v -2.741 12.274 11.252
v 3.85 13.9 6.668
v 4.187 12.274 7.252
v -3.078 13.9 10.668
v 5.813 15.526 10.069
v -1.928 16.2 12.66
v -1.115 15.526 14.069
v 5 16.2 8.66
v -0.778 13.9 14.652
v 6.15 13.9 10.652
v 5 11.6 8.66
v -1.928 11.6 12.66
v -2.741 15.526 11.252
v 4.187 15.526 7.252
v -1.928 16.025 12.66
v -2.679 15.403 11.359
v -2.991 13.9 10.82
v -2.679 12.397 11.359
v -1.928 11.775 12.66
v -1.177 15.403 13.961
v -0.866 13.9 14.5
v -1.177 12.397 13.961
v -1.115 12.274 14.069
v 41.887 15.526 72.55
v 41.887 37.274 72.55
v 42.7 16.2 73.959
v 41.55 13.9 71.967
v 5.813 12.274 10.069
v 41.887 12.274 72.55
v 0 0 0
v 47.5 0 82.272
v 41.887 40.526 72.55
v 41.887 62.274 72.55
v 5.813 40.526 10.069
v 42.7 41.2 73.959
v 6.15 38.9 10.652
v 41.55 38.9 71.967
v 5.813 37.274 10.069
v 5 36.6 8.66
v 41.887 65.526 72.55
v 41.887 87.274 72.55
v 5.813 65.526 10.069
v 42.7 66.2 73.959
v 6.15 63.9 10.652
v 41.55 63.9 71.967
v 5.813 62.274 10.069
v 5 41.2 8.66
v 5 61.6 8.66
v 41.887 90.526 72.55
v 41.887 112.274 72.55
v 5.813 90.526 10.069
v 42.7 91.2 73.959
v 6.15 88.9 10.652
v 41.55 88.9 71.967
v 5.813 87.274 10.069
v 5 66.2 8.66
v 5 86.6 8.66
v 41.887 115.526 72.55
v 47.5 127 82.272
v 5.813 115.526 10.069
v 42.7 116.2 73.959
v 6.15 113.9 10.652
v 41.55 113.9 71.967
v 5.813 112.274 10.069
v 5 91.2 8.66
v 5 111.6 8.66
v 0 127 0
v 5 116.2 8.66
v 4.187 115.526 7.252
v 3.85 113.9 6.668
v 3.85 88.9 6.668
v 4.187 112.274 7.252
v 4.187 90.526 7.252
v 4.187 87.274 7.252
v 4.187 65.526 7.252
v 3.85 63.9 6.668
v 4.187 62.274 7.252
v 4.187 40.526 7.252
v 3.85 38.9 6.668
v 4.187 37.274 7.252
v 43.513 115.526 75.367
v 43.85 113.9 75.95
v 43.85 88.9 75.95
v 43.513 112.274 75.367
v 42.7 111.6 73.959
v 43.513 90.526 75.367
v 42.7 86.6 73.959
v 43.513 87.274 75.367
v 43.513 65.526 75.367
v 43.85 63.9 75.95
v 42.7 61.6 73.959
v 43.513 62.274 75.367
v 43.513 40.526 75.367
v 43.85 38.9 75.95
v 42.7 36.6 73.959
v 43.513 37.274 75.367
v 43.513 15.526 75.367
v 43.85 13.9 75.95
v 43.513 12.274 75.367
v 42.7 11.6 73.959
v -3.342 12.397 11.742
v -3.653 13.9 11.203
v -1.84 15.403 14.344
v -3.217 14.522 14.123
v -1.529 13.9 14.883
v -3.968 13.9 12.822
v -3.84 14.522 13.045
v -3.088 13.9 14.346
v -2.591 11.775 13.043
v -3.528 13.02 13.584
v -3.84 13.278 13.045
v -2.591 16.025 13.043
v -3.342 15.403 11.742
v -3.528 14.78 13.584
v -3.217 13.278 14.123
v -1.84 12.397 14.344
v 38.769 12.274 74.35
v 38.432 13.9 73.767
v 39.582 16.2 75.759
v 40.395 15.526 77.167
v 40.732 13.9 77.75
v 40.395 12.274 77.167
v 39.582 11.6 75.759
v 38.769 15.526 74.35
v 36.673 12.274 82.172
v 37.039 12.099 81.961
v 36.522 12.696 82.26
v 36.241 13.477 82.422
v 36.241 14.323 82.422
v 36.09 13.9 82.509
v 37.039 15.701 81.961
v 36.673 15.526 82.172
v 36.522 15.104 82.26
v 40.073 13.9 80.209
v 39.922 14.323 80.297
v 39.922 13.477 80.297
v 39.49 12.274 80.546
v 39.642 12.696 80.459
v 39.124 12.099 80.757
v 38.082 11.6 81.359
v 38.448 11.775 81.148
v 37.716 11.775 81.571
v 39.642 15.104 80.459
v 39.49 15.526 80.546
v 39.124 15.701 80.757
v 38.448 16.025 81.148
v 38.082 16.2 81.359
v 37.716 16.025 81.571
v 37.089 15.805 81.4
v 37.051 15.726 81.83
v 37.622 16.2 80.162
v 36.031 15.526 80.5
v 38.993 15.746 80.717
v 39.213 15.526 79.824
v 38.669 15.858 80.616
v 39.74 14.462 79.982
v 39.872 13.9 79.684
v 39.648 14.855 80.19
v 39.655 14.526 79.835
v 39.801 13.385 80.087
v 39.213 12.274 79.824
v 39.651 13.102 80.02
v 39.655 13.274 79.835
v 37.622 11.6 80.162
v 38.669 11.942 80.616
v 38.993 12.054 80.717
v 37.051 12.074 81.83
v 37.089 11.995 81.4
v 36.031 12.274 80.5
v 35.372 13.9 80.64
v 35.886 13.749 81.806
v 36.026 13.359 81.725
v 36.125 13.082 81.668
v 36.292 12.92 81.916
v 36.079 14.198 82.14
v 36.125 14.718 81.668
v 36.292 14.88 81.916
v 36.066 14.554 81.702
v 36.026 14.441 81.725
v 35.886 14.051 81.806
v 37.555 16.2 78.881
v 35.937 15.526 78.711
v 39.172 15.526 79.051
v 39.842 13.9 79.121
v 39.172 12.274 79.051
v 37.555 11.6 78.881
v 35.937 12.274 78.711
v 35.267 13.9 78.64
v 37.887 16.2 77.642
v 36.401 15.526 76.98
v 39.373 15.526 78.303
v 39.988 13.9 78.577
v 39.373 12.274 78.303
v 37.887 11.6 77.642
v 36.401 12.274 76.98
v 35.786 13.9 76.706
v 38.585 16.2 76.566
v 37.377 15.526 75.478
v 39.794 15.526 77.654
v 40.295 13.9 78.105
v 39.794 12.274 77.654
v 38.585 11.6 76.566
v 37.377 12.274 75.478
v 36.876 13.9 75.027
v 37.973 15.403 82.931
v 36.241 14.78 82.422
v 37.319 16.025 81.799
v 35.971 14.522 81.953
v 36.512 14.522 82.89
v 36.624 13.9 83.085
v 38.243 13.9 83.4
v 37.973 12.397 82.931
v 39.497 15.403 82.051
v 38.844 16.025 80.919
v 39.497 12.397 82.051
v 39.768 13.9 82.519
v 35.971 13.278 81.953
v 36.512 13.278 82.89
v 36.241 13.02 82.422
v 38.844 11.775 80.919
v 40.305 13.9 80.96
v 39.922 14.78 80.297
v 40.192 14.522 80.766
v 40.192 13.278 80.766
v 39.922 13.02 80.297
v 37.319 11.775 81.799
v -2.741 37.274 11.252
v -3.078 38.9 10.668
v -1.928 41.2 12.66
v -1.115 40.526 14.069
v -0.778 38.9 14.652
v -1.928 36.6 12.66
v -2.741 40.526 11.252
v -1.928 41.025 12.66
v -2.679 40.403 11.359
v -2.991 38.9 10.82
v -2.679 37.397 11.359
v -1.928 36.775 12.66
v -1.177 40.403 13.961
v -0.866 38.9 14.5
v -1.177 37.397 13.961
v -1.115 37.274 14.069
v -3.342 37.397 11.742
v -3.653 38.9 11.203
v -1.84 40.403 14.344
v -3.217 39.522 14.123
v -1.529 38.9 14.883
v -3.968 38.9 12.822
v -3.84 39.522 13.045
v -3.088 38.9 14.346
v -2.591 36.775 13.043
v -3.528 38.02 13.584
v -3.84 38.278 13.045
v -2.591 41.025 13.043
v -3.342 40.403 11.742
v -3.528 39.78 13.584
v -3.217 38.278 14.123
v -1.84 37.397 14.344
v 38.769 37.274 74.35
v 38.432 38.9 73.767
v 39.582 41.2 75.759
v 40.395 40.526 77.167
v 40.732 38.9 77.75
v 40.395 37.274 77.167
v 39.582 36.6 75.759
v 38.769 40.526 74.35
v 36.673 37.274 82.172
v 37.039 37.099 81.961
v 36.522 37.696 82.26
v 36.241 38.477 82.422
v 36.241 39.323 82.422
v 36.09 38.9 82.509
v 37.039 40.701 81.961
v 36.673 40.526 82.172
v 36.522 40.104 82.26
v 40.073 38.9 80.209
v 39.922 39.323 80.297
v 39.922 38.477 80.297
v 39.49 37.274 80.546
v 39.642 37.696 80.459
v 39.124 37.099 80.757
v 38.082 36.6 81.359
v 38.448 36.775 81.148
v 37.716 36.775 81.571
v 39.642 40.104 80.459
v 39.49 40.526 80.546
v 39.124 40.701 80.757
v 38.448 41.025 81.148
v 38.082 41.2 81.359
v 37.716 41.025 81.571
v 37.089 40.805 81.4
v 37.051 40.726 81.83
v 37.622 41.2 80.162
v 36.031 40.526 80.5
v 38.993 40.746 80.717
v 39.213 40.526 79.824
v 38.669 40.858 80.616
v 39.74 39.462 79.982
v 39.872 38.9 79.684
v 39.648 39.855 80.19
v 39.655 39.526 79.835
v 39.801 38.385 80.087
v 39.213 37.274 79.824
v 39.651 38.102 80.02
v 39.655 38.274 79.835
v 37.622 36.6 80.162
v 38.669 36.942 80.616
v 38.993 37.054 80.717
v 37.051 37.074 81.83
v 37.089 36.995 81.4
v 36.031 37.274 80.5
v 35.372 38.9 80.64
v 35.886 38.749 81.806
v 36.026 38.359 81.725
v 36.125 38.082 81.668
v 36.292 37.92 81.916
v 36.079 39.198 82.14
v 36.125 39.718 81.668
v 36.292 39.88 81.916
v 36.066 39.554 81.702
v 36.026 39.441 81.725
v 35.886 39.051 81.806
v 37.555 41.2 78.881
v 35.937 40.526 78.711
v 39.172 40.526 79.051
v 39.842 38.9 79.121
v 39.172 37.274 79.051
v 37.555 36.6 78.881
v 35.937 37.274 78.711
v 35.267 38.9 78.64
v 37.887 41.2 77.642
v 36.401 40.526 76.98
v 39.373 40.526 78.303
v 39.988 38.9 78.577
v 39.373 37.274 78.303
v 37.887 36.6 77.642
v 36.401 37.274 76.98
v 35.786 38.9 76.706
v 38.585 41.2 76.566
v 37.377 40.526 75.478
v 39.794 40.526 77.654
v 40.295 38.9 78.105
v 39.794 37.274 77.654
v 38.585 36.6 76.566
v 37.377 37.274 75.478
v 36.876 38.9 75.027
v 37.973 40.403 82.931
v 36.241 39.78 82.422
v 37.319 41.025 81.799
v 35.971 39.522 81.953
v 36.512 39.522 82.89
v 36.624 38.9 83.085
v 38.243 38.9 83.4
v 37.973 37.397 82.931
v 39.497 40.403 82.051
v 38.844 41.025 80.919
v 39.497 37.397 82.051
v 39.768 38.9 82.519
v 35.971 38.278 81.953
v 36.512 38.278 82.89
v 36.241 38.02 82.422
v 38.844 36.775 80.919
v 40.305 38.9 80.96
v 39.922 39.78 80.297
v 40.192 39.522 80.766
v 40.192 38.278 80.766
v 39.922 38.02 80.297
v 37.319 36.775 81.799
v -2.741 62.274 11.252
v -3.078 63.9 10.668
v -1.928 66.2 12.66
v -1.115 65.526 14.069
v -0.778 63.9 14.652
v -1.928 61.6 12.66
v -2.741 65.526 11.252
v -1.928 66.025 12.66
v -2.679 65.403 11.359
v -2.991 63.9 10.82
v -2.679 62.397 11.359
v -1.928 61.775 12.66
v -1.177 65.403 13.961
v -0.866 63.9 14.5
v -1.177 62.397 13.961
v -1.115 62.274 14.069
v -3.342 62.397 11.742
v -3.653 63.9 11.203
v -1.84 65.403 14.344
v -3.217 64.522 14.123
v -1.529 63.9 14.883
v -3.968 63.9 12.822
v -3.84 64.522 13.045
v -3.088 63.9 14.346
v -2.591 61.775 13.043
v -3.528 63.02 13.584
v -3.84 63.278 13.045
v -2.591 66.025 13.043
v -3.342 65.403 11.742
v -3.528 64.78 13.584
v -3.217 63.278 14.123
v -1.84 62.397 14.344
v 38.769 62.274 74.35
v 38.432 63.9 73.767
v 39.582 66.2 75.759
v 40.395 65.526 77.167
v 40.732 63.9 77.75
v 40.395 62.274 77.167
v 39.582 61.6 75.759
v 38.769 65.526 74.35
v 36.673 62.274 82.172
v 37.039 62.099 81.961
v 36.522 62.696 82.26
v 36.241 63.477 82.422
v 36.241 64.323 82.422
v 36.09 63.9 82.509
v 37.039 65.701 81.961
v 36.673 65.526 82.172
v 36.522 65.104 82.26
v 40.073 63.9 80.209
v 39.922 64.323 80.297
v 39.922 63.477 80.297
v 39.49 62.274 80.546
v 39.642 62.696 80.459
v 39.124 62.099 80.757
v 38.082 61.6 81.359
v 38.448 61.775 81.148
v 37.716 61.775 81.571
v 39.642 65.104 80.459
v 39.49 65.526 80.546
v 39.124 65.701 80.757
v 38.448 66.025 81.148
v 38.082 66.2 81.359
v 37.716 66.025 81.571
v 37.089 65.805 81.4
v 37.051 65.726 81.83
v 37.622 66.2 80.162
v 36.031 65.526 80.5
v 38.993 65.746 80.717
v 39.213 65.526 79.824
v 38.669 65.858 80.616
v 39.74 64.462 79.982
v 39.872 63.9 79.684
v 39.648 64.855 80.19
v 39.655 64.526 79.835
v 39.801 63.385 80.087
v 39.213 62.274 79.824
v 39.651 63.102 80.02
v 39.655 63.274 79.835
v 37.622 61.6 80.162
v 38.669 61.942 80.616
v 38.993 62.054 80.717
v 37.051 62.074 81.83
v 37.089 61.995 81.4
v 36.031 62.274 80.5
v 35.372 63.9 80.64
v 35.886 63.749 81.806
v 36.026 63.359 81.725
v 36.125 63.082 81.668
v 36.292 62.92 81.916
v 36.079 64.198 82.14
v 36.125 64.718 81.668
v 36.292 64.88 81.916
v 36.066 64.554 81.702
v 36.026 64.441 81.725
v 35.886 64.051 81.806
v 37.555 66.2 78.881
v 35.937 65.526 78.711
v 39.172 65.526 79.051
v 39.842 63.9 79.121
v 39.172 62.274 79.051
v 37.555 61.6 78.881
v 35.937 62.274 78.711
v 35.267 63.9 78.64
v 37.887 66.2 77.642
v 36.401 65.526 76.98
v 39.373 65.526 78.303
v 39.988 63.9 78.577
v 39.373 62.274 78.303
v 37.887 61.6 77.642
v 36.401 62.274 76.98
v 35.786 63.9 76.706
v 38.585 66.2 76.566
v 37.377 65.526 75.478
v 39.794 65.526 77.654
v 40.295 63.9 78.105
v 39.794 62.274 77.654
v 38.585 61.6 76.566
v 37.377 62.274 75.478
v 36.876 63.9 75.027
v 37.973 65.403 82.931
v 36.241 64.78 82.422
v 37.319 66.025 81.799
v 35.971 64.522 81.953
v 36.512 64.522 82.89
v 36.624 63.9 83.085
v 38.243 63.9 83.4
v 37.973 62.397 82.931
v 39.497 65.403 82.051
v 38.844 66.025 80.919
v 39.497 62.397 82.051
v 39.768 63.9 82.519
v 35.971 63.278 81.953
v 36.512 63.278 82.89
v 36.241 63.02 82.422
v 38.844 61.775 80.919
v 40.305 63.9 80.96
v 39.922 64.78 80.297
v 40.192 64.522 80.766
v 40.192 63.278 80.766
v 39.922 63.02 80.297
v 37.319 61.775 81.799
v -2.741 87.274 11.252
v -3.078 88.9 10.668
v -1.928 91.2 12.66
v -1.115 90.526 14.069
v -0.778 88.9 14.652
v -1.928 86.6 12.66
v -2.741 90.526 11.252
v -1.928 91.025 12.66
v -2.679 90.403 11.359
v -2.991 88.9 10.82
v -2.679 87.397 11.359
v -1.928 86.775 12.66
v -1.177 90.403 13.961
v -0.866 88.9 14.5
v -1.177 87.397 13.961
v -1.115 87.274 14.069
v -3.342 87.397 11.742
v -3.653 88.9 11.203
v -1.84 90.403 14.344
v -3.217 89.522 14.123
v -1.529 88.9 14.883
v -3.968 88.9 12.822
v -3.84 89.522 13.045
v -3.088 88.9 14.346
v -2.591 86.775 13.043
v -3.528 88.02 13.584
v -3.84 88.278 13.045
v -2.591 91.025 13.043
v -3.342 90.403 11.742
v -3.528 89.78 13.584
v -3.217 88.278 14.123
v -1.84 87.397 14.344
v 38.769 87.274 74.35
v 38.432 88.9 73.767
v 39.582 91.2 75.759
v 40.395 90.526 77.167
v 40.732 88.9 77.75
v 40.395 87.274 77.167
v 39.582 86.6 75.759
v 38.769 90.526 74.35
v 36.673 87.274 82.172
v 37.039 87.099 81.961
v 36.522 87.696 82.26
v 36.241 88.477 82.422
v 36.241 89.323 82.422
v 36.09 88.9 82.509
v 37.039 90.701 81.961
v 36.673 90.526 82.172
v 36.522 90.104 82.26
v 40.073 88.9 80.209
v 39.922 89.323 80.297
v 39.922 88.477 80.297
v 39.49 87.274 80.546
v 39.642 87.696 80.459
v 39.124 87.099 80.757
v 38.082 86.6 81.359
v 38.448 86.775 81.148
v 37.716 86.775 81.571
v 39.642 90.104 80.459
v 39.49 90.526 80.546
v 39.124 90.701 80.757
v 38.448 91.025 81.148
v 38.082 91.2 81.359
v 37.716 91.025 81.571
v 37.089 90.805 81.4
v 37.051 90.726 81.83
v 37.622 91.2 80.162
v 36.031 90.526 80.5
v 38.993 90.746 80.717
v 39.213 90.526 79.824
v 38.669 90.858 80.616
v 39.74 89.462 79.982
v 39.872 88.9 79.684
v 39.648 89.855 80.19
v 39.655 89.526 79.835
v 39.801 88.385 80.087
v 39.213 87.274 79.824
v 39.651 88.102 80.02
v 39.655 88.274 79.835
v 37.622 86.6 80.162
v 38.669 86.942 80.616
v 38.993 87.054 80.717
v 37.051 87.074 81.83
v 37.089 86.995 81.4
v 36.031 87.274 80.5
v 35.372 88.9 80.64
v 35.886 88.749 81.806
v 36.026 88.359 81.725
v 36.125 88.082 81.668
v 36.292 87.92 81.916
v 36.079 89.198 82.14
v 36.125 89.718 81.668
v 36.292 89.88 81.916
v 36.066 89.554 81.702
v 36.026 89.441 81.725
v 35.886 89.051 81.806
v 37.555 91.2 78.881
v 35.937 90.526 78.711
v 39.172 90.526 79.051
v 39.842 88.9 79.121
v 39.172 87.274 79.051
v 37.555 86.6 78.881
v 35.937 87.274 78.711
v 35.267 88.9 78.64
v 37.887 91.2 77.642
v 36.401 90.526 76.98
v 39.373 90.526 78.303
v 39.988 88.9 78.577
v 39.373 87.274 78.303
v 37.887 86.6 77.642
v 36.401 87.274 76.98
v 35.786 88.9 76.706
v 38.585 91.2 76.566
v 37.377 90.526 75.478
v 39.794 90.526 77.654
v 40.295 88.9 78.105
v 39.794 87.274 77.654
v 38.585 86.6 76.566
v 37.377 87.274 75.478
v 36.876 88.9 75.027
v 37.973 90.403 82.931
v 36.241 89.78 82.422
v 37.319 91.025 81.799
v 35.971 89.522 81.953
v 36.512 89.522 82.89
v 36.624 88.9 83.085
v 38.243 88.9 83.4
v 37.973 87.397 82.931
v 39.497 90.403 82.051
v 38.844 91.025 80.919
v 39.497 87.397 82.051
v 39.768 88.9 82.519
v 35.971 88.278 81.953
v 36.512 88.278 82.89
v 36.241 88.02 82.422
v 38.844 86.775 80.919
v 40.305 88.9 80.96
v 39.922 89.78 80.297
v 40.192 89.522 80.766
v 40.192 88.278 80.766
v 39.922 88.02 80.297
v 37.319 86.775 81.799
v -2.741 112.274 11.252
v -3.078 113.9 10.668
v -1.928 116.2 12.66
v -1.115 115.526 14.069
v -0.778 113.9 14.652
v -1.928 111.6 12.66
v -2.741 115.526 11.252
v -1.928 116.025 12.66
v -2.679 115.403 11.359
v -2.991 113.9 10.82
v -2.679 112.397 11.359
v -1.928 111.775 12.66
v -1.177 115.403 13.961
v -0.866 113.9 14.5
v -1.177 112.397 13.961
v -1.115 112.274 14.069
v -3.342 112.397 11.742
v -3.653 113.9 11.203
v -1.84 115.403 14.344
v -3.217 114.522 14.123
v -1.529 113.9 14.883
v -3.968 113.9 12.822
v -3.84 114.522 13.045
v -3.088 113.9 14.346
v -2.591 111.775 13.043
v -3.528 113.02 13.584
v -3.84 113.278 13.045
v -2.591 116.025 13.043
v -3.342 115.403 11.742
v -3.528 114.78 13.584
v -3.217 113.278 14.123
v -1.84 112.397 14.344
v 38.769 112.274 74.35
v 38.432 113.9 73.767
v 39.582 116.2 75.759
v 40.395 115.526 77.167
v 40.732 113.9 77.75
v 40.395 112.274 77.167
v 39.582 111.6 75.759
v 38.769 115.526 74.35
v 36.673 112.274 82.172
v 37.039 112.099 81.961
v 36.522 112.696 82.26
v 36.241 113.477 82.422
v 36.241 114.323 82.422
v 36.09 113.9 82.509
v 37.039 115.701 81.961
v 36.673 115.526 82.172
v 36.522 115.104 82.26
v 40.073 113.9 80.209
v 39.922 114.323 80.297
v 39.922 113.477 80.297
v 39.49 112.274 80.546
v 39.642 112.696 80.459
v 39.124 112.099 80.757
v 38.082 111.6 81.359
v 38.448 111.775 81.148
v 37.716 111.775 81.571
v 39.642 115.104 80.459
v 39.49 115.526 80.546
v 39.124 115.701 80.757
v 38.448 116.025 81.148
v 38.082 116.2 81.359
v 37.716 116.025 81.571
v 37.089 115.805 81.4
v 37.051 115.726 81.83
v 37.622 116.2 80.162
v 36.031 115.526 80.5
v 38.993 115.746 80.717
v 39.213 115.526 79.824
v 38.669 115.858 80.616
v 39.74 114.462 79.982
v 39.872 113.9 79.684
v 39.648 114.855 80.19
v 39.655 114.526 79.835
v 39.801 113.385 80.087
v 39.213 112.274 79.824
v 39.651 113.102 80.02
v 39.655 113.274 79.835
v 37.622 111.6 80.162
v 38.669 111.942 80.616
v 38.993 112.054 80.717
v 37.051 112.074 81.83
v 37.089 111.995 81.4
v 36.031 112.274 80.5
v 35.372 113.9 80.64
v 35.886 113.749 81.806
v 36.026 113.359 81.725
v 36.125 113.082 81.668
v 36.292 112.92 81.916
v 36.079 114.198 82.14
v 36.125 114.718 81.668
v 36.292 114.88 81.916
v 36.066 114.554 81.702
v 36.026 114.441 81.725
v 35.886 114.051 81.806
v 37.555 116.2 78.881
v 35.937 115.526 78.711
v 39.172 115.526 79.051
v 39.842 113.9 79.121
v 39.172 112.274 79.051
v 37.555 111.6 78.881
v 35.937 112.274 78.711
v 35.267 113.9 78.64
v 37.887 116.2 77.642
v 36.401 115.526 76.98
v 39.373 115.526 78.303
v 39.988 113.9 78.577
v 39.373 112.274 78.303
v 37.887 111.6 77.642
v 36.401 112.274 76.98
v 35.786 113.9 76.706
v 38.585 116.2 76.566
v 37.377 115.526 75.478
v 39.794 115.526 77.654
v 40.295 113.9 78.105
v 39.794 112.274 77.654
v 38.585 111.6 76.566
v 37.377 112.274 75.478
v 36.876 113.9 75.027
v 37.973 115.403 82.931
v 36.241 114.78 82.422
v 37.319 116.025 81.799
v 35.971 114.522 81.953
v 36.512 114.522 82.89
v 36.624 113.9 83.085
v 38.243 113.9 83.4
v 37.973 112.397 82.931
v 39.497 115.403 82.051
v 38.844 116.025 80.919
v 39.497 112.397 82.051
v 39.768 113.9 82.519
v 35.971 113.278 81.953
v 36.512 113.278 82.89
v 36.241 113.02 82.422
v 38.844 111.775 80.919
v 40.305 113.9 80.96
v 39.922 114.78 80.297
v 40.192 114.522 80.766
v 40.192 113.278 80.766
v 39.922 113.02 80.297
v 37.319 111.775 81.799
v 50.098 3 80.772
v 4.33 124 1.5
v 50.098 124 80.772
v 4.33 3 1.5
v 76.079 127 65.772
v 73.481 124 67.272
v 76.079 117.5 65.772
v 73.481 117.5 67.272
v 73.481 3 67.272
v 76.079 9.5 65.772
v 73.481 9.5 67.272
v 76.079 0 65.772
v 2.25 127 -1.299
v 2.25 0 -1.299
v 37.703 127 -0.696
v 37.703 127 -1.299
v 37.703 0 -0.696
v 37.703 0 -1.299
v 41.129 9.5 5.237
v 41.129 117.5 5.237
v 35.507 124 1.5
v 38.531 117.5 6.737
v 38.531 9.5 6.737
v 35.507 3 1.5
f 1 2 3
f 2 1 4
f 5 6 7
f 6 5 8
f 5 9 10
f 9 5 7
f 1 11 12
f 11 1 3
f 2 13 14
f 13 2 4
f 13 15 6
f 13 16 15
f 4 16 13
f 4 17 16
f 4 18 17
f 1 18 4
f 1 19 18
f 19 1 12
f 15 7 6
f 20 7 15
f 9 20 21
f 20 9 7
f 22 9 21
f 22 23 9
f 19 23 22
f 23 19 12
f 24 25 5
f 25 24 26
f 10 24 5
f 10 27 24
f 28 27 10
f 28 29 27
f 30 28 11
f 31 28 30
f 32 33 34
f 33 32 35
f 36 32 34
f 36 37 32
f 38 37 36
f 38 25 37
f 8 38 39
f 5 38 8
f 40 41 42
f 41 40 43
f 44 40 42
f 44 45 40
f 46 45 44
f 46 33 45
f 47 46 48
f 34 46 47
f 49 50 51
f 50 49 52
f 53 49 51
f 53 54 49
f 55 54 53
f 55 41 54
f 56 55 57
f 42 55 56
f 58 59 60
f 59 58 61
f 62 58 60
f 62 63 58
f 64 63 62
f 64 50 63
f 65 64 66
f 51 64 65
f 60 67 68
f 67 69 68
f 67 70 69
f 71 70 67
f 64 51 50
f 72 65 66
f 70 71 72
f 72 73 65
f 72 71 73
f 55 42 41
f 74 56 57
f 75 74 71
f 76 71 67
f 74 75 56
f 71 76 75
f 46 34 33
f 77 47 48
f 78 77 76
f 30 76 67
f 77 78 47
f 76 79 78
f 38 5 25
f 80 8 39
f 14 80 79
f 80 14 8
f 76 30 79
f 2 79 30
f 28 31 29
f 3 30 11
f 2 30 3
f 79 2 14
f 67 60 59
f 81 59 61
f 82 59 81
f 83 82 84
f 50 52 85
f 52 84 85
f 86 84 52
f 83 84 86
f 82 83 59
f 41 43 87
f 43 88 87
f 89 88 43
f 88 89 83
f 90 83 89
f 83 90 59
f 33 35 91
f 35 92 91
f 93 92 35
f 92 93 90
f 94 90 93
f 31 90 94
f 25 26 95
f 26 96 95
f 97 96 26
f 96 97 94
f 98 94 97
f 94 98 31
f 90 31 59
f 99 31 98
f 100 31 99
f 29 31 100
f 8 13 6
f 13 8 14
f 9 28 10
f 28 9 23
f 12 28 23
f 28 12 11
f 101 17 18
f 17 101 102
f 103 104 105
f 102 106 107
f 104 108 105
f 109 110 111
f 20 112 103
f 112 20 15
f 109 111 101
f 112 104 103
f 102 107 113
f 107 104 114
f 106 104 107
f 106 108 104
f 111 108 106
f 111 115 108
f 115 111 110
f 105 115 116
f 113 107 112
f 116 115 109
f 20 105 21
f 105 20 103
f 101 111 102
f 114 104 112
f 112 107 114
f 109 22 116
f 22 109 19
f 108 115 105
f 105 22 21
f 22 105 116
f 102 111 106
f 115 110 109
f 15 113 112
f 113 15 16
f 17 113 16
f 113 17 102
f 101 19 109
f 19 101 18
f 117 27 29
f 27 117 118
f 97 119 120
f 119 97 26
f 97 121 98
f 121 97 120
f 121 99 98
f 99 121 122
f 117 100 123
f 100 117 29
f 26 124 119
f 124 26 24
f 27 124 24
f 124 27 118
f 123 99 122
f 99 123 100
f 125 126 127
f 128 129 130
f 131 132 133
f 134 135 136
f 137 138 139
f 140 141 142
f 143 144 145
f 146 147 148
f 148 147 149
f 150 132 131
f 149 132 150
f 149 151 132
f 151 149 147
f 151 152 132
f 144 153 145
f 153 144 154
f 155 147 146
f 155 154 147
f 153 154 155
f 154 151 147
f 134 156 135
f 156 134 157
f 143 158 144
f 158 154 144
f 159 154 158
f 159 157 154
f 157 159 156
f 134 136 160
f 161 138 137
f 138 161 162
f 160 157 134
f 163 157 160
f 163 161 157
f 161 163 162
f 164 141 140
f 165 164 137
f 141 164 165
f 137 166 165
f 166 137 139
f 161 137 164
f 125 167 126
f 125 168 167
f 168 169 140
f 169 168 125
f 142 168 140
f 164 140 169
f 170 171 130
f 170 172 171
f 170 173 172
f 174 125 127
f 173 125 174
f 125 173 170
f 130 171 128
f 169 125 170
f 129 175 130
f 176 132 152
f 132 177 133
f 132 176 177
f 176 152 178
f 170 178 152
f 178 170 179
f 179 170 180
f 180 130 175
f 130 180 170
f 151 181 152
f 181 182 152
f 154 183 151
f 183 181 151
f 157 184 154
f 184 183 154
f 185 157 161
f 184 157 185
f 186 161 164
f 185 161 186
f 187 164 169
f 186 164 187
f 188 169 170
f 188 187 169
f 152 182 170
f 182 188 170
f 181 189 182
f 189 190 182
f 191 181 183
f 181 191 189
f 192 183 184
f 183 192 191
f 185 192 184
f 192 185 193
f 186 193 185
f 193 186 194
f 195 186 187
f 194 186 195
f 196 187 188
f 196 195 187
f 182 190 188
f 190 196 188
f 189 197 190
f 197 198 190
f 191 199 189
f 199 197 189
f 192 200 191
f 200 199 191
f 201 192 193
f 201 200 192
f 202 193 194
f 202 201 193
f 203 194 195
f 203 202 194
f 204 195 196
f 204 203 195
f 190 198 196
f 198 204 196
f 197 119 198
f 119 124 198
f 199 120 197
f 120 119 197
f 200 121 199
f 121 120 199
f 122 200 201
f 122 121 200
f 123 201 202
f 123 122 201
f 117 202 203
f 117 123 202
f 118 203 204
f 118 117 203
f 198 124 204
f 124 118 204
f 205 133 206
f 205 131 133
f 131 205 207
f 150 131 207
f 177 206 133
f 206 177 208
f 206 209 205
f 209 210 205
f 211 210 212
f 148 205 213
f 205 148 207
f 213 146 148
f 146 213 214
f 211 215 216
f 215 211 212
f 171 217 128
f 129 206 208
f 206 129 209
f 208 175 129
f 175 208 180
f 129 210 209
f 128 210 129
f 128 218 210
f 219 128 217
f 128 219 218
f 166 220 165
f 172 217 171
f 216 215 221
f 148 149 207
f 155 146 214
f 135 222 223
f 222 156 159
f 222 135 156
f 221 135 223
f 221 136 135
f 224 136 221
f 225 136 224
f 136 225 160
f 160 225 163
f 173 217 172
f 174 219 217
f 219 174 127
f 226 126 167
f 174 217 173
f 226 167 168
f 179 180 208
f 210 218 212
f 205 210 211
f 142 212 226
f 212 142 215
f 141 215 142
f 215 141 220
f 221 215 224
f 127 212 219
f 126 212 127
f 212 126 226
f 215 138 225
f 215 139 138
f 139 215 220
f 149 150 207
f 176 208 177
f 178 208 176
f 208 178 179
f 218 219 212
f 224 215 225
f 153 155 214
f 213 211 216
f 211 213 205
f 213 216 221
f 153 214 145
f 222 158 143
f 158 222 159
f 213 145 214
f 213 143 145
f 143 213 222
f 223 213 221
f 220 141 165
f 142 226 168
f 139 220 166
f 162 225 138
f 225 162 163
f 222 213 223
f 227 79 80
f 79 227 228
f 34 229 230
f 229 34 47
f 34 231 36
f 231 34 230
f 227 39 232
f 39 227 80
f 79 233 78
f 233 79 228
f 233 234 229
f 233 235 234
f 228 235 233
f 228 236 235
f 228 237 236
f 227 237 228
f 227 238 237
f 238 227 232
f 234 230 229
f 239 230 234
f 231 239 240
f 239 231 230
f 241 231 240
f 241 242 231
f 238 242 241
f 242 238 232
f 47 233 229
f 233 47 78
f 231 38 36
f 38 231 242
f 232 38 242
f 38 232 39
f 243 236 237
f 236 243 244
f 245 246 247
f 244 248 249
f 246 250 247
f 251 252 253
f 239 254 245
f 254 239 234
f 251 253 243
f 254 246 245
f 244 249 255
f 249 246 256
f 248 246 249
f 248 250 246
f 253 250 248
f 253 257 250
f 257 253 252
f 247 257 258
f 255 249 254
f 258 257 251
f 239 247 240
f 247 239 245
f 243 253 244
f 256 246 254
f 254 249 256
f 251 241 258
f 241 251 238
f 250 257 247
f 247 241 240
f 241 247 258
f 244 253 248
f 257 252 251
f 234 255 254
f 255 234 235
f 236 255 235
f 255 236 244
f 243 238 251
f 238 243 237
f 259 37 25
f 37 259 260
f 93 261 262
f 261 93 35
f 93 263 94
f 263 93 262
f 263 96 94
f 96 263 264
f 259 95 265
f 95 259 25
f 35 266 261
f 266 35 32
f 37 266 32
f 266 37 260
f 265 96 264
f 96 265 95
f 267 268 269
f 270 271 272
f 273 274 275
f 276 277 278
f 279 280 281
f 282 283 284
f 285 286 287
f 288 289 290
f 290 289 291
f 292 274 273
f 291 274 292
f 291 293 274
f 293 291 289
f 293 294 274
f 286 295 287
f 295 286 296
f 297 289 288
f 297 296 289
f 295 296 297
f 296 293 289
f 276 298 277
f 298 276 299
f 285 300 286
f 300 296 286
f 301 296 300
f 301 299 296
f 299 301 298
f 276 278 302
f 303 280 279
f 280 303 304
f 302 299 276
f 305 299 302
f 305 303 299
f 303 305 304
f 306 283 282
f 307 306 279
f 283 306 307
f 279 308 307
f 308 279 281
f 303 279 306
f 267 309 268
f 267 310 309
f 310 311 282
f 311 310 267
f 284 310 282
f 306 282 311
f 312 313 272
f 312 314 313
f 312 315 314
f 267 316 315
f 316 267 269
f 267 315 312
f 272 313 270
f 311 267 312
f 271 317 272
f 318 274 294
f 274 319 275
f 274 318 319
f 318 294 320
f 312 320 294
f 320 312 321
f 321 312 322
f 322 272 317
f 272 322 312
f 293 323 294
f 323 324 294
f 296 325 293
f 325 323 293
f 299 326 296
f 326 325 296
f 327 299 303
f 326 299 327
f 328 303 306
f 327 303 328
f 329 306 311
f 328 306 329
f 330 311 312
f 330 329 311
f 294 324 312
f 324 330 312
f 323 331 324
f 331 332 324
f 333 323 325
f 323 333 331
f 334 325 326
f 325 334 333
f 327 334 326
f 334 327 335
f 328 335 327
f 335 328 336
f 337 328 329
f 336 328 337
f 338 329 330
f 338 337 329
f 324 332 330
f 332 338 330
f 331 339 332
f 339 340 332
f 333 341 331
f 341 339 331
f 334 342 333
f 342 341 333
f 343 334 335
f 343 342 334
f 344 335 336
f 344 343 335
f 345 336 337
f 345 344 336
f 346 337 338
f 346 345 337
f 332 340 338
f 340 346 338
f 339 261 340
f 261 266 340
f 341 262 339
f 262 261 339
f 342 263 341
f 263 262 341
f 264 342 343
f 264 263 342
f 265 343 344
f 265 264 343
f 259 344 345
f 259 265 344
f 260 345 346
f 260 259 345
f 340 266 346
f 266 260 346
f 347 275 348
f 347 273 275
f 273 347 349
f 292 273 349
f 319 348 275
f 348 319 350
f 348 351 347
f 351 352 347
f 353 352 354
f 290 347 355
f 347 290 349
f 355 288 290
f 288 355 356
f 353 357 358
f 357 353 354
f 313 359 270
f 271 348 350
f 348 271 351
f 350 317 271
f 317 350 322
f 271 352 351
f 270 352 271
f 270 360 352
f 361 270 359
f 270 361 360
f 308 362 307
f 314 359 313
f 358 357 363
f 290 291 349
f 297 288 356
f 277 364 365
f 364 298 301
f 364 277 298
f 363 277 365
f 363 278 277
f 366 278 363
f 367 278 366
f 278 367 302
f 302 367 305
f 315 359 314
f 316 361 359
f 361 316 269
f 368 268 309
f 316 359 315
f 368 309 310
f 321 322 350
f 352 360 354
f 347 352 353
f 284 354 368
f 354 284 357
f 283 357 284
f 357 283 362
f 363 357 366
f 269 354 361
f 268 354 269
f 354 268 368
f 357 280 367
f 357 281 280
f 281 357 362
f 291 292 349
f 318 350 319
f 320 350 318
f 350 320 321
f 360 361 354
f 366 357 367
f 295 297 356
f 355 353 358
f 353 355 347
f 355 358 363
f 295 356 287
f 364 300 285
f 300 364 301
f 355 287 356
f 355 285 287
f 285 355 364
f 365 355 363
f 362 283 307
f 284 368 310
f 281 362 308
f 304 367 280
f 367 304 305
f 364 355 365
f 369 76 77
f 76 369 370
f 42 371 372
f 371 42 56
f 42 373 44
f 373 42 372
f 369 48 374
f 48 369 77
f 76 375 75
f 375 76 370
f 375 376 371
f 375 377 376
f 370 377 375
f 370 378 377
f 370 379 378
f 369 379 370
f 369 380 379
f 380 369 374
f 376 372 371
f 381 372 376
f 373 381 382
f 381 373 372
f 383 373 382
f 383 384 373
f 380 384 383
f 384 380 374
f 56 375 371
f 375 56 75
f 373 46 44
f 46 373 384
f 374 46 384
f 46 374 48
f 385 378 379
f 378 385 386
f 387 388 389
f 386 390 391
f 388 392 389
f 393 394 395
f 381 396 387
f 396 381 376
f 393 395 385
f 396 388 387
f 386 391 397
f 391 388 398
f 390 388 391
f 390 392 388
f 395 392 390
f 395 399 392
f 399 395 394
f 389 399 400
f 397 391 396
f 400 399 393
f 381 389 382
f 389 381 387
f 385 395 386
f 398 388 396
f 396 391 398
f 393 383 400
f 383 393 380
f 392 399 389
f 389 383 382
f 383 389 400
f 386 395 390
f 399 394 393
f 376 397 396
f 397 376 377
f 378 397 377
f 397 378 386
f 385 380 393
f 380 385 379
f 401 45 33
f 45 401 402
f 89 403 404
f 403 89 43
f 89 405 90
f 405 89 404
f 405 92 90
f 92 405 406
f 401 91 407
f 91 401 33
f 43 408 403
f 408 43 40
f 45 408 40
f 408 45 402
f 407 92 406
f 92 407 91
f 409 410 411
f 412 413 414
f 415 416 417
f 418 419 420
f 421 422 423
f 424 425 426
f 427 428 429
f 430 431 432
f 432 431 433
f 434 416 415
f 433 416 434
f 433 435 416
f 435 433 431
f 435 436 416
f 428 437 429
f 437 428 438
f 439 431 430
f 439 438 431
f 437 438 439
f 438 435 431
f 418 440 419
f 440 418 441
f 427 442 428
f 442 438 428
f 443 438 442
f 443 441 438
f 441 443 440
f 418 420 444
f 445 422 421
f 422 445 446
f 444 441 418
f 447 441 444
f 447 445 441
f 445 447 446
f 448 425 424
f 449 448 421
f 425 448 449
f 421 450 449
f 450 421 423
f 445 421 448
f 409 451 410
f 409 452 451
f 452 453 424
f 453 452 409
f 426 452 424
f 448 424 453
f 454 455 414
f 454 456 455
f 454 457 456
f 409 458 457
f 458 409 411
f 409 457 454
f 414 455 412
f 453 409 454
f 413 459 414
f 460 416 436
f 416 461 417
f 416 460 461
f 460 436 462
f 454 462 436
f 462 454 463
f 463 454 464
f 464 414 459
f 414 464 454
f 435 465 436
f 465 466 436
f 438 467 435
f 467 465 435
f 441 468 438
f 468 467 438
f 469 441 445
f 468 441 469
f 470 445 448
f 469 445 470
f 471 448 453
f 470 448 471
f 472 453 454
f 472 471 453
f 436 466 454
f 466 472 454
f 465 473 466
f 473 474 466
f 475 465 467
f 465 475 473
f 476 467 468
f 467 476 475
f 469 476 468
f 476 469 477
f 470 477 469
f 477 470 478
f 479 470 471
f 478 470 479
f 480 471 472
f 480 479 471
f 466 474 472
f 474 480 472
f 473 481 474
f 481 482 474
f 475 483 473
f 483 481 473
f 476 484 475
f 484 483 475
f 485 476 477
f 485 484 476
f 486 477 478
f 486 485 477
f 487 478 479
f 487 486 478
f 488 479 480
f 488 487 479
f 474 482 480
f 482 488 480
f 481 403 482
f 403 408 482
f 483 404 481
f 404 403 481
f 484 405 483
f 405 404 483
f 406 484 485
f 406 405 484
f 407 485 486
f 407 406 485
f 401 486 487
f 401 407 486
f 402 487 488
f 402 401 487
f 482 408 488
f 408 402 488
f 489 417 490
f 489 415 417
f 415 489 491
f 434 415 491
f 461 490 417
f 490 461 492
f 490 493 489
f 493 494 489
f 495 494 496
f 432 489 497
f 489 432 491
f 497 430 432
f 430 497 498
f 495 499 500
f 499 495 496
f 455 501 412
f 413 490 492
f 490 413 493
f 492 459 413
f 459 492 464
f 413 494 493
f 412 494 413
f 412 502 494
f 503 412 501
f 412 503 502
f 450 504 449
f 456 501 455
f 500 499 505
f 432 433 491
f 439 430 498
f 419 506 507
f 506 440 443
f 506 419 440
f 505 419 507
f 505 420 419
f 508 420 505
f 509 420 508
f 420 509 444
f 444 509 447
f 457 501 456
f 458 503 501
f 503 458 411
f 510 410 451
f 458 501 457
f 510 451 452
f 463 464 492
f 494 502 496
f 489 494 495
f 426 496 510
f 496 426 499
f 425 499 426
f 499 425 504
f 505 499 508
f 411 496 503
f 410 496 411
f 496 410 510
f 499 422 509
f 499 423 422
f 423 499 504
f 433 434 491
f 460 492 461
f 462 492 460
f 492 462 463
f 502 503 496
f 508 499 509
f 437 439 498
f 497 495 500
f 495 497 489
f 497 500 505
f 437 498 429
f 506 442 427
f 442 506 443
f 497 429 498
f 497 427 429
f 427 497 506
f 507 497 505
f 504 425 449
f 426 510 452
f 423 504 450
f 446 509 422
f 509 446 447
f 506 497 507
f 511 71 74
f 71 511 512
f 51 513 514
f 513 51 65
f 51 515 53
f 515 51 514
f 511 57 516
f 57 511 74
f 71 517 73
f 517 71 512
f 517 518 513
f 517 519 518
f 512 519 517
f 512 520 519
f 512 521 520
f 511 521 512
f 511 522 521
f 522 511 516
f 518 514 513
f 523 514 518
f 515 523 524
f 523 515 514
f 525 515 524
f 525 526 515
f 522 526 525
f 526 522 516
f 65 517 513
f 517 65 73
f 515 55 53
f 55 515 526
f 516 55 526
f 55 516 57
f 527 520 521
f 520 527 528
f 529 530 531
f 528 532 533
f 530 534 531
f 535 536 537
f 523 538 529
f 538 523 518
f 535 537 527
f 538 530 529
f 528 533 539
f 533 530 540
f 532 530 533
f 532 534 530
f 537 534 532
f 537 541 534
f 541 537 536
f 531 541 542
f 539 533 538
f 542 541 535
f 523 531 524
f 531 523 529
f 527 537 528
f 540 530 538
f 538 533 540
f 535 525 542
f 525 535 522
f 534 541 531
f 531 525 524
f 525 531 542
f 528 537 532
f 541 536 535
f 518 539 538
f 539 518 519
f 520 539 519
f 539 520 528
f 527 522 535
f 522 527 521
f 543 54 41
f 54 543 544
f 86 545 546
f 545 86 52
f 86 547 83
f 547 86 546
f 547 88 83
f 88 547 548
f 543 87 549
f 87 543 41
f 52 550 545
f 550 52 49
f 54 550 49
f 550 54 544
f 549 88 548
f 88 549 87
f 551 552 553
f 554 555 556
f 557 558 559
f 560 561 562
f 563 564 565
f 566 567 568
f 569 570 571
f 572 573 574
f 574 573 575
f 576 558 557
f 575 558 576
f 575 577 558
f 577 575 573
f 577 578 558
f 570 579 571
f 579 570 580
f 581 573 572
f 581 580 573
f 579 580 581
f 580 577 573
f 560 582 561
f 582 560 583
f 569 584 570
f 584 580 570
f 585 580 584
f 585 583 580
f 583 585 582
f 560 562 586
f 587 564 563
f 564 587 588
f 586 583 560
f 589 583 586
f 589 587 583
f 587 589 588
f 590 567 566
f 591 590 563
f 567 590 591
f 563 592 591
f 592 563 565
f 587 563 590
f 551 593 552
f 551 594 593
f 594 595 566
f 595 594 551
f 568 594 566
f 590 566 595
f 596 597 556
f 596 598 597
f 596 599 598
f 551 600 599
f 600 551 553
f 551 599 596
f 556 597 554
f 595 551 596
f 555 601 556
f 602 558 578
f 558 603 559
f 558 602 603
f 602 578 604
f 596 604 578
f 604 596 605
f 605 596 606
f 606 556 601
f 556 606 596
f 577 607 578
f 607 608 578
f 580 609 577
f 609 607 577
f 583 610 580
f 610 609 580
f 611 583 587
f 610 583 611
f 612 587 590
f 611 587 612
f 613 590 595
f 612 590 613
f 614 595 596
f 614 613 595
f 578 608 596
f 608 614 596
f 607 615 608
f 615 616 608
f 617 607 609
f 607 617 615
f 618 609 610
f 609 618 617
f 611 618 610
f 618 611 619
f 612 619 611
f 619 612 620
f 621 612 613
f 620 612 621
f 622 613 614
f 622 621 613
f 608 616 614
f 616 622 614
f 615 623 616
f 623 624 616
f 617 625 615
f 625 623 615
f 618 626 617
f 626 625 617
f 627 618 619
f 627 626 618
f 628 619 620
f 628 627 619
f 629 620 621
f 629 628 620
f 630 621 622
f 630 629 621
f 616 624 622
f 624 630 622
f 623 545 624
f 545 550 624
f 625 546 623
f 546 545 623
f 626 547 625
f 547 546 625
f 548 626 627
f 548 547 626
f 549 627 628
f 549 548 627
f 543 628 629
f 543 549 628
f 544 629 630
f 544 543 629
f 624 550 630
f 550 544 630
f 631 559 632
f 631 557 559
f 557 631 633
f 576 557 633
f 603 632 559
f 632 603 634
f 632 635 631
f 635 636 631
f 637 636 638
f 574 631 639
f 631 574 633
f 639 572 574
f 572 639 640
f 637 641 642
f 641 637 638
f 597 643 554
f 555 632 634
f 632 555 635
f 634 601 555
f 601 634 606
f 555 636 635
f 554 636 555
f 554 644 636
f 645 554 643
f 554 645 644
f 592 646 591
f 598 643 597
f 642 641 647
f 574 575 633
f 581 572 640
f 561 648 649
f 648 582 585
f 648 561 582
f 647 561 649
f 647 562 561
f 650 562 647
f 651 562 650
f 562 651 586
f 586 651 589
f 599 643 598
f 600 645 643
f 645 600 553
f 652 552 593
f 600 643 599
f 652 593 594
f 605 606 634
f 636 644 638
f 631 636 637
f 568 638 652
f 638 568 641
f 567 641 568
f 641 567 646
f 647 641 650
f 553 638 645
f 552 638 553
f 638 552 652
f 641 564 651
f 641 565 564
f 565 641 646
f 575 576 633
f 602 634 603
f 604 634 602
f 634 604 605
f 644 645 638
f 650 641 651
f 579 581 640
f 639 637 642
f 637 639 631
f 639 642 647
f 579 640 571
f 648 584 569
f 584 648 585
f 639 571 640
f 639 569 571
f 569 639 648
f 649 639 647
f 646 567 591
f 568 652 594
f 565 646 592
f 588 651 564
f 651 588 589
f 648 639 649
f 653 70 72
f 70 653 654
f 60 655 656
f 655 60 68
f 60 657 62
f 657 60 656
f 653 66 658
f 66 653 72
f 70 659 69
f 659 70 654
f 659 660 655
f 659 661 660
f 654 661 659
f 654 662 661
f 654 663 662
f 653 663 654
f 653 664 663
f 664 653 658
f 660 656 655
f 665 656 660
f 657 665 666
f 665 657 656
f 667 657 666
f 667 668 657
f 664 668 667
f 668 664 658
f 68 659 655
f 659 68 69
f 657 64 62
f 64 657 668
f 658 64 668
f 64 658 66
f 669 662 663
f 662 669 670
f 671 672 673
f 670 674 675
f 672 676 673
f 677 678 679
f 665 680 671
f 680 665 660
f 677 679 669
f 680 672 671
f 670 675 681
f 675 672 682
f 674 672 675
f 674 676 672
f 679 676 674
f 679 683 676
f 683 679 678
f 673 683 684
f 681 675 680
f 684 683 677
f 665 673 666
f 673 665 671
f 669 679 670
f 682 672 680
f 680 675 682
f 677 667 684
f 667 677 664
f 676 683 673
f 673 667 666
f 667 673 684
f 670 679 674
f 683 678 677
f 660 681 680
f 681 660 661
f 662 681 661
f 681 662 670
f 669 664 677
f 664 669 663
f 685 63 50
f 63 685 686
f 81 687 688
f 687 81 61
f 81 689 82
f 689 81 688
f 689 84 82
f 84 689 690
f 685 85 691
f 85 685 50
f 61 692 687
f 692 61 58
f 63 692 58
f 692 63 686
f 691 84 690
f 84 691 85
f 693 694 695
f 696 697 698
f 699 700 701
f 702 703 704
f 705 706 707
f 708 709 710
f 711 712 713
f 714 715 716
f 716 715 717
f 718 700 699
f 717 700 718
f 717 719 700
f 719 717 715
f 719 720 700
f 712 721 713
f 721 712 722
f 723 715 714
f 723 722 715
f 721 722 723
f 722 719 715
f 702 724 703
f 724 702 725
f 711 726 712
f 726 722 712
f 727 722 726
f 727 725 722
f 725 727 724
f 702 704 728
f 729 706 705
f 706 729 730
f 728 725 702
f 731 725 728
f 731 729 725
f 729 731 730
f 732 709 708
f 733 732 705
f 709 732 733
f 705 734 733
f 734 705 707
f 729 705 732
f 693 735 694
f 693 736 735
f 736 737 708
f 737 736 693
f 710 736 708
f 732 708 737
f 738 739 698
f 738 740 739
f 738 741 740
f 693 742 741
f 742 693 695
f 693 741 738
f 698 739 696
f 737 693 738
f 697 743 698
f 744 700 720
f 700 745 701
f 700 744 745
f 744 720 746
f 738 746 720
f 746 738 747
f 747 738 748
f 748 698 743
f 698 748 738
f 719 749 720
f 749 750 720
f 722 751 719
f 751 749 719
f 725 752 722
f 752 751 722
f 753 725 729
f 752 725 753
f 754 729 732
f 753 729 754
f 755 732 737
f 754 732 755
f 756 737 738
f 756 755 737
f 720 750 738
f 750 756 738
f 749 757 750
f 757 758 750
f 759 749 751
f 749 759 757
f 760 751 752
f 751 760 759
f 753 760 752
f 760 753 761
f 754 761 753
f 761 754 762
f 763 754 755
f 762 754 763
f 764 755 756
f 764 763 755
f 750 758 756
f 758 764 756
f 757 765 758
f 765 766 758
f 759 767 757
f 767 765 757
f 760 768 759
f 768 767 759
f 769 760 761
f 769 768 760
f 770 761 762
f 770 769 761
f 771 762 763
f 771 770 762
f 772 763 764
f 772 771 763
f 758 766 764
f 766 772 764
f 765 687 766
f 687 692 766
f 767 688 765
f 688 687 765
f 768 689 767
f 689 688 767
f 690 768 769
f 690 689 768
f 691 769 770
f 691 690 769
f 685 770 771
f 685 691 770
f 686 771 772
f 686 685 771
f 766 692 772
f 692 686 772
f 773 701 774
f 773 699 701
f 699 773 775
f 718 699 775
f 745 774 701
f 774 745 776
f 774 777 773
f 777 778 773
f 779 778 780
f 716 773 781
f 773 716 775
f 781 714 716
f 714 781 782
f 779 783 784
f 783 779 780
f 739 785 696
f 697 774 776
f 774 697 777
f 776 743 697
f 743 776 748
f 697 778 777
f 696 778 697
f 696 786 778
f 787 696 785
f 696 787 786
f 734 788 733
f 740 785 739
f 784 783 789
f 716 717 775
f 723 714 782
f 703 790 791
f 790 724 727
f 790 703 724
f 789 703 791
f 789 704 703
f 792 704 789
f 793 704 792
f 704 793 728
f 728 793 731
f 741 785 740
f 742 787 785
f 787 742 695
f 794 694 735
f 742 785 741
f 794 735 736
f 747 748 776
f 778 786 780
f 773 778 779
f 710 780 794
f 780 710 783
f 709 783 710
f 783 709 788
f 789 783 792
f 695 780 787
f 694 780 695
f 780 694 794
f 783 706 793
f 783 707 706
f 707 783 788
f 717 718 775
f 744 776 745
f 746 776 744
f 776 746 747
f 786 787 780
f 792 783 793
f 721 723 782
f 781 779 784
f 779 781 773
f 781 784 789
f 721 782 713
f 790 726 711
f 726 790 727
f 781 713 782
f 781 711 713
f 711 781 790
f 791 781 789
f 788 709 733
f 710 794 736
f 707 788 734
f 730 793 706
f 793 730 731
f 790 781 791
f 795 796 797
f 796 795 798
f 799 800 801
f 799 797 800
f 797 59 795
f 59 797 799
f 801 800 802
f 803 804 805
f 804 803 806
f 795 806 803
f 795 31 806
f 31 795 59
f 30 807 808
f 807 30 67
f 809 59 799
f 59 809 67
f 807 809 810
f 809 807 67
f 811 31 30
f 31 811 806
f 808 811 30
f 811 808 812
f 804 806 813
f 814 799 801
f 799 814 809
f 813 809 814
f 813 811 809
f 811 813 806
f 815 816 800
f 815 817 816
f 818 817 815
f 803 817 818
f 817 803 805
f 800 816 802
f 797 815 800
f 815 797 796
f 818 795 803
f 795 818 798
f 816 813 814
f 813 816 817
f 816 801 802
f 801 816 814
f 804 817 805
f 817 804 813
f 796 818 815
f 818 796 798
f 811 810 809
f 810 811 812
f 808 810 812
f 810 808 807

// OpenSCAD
// file: pegboard.scad
/* pin dimentions */
pin_diameter = 5;
pin_spacing = 25;
pin_length = 10;
pin_tip_height = 2;
pin_clearance = 0.4;

/* pegboard width */
pegboard_width = 3;
pegboard_clearance = 0.6;

/* base width */
base_width = 3;

/* angle */
angle = 30;

/* DON'T TOUCH BELOW HERE! Internal values! */
epsilon = 0.1;
pin_diameter_ = pin_diameter - pin_clearance;


module torus(r1, r2, angle=360) {
    rotate_extrude(angle=angle) translate([r2, 0, 0]) circle(r=r1);
}

module pin() {
    union() {
        cylinder(h=pin_length - pin_tip_height, r=pin_diameter_/2);
        translate([0, 0, pin_length - pin_tip_height])
            scale([1, 1, (pin_tip_height * 2 / pin_diameter_)])
                sphere(d=pin_diameter_);
    }
}

module curvy_pin() {
    _pegboard_width = pegboard_width + pegboard_clearance;

    torus_outer_radius = pin_length - _pegboard_width;
    torus_r1 = pin_diameter_/2;
    torus_r2 = torus_outer_radius - torus_r1;

    union() {
        translate([0, 0, 0])
            cylinder(h=_pegboard_width, r=pin_diameter_/2);

        translate([torus_outer_radius/2 - torus_r1,
                   0,
                   torus_outer_radius/2 + _pegboard_width])
            rotate([90, 0, 0])
                translate([torus_outer_radius/2, -torus_outer_radius/2, 0])
                    rotate([0, 0, 90])
                        torus(r1=torus_r1, r2=torus_r2, angle=90);

        translate([torus_outer_radius-torus_r1 + 0*_pegboard_width/2, 0, pin_length - pin_diameter_/2])
            scale([(pin_tip_height*2/pin_diameter_), 1, 1])
                sphere(d=pin_diameter_);
    }
}

module pin_pair(spacing=pin_spacing + pin_clearance) {
    translate([0, pin_diameter_/2, pin_diameter_/2])
        rotate([0, -90, 0])
            union() {
                pin();
                translate([spacing, 0, 0]) curvy_pin();
        }
}

module fill_with_pin_pairs(width, height) {
    spacing_between = pin_spacing - pin_diameter_;

    pin_count_horizontal = floor((width + spacing_between) / (pin_diameter_ + spacing_between));
    padding_horizontal = (width - (pin_count_horizontal * pin_diameter_ + (pin_count_horizontal - 1) * spacing_between)) / 2;

    pin_count_vertical = floor((height + spacing_between) / (pin_diameter_ + spacing_between));
    spacing_vertical = (pin_count_vertical - 1) * pin_spacing;
    padding_vertical = (height - spacing_vertical - pin_diameter_) / 2;

    translate([0, padding_horizontal, padding_vertical]) {
        for (i = [1:pin_count_horizontal]) {
            translate([0, (i-1) * pin_spacing + pin_clearance, 0])
                pin_pair(spacing_vertical + pin_clearance);
        }
    }
}

module base(width, height) {
    union(){
        cube([base_width, width, height]);
        fill_with_pin_pairs(width, height);
    }
}
// main file
include <pegboard.scad>

open_front_bin_height = 95;
open_front_bin_width = 127;
open_front_bin_depth = 33;
open_front_bin_thickness = 3;

open_front_bin_opening_width = 108;
open_front_bin_opening_height = 70;

module open_front_bin(
    dimensions=[
        open_front_bin_depth,
        open_front_bin_width,
        open_front_bin_height
        ],

    opening_dimensions=[
        0,
        open_front_bin_opening_width,
        open_front_bin_opening_height
        ],

    thickness=open_front_bin_thickness,
    ) {

    outer_cube = dimensions;

    inner_cube = dimensions - 2 * [thickness, thickness, -epsilon];

    bottom_cube = [
        dimensions.x / cos(angle) - 2 * thickness * sin(angle),
        dimensions.y,
        thickness
        ];

    angle_cube = [
        dimensions.x * 2,
        dimensions.y + 2 * epsilon,
        dimensions.z
        ];

    opening_cube = [thickness + 2 * epsilon, 0, 0] + opening_dimensions;

    difference() {
        union() {
            base(dimensions.y, dimensions.z);

            difference() {
                cube(outer_cube);
                translate(
                    [
                        thickness,
                        thickness,
                        -epsilon
                        ]
                    )
                    cube(inner_cube);

                translate(
                    [
                        dimensions.x - thickness - epsilon,
                        dimensions.y / 2 - opening_dimensions.y / 2,
                        dimensions.z - opening_dimensions.z + epsilon
                        ]
                    )
                    cube(opening_cube);
            }


            translate(
                [
                    2*thickness * sin(angle),
                    0 ,
                    0
                    ]
                ) {
                rotate([0, -angle, 0])
                    cube(bottom_cube);
            }
        }
 
       translate(
           [
               0,
               -epsilon,
               -thickness * sin(angle)
               ]
           ) {

           rotate([0, 1 * (90 - angle), 0])
               cube(angle_cube);
       }
    }
}

rotate([0, angle, 0]) open_front_bin();
